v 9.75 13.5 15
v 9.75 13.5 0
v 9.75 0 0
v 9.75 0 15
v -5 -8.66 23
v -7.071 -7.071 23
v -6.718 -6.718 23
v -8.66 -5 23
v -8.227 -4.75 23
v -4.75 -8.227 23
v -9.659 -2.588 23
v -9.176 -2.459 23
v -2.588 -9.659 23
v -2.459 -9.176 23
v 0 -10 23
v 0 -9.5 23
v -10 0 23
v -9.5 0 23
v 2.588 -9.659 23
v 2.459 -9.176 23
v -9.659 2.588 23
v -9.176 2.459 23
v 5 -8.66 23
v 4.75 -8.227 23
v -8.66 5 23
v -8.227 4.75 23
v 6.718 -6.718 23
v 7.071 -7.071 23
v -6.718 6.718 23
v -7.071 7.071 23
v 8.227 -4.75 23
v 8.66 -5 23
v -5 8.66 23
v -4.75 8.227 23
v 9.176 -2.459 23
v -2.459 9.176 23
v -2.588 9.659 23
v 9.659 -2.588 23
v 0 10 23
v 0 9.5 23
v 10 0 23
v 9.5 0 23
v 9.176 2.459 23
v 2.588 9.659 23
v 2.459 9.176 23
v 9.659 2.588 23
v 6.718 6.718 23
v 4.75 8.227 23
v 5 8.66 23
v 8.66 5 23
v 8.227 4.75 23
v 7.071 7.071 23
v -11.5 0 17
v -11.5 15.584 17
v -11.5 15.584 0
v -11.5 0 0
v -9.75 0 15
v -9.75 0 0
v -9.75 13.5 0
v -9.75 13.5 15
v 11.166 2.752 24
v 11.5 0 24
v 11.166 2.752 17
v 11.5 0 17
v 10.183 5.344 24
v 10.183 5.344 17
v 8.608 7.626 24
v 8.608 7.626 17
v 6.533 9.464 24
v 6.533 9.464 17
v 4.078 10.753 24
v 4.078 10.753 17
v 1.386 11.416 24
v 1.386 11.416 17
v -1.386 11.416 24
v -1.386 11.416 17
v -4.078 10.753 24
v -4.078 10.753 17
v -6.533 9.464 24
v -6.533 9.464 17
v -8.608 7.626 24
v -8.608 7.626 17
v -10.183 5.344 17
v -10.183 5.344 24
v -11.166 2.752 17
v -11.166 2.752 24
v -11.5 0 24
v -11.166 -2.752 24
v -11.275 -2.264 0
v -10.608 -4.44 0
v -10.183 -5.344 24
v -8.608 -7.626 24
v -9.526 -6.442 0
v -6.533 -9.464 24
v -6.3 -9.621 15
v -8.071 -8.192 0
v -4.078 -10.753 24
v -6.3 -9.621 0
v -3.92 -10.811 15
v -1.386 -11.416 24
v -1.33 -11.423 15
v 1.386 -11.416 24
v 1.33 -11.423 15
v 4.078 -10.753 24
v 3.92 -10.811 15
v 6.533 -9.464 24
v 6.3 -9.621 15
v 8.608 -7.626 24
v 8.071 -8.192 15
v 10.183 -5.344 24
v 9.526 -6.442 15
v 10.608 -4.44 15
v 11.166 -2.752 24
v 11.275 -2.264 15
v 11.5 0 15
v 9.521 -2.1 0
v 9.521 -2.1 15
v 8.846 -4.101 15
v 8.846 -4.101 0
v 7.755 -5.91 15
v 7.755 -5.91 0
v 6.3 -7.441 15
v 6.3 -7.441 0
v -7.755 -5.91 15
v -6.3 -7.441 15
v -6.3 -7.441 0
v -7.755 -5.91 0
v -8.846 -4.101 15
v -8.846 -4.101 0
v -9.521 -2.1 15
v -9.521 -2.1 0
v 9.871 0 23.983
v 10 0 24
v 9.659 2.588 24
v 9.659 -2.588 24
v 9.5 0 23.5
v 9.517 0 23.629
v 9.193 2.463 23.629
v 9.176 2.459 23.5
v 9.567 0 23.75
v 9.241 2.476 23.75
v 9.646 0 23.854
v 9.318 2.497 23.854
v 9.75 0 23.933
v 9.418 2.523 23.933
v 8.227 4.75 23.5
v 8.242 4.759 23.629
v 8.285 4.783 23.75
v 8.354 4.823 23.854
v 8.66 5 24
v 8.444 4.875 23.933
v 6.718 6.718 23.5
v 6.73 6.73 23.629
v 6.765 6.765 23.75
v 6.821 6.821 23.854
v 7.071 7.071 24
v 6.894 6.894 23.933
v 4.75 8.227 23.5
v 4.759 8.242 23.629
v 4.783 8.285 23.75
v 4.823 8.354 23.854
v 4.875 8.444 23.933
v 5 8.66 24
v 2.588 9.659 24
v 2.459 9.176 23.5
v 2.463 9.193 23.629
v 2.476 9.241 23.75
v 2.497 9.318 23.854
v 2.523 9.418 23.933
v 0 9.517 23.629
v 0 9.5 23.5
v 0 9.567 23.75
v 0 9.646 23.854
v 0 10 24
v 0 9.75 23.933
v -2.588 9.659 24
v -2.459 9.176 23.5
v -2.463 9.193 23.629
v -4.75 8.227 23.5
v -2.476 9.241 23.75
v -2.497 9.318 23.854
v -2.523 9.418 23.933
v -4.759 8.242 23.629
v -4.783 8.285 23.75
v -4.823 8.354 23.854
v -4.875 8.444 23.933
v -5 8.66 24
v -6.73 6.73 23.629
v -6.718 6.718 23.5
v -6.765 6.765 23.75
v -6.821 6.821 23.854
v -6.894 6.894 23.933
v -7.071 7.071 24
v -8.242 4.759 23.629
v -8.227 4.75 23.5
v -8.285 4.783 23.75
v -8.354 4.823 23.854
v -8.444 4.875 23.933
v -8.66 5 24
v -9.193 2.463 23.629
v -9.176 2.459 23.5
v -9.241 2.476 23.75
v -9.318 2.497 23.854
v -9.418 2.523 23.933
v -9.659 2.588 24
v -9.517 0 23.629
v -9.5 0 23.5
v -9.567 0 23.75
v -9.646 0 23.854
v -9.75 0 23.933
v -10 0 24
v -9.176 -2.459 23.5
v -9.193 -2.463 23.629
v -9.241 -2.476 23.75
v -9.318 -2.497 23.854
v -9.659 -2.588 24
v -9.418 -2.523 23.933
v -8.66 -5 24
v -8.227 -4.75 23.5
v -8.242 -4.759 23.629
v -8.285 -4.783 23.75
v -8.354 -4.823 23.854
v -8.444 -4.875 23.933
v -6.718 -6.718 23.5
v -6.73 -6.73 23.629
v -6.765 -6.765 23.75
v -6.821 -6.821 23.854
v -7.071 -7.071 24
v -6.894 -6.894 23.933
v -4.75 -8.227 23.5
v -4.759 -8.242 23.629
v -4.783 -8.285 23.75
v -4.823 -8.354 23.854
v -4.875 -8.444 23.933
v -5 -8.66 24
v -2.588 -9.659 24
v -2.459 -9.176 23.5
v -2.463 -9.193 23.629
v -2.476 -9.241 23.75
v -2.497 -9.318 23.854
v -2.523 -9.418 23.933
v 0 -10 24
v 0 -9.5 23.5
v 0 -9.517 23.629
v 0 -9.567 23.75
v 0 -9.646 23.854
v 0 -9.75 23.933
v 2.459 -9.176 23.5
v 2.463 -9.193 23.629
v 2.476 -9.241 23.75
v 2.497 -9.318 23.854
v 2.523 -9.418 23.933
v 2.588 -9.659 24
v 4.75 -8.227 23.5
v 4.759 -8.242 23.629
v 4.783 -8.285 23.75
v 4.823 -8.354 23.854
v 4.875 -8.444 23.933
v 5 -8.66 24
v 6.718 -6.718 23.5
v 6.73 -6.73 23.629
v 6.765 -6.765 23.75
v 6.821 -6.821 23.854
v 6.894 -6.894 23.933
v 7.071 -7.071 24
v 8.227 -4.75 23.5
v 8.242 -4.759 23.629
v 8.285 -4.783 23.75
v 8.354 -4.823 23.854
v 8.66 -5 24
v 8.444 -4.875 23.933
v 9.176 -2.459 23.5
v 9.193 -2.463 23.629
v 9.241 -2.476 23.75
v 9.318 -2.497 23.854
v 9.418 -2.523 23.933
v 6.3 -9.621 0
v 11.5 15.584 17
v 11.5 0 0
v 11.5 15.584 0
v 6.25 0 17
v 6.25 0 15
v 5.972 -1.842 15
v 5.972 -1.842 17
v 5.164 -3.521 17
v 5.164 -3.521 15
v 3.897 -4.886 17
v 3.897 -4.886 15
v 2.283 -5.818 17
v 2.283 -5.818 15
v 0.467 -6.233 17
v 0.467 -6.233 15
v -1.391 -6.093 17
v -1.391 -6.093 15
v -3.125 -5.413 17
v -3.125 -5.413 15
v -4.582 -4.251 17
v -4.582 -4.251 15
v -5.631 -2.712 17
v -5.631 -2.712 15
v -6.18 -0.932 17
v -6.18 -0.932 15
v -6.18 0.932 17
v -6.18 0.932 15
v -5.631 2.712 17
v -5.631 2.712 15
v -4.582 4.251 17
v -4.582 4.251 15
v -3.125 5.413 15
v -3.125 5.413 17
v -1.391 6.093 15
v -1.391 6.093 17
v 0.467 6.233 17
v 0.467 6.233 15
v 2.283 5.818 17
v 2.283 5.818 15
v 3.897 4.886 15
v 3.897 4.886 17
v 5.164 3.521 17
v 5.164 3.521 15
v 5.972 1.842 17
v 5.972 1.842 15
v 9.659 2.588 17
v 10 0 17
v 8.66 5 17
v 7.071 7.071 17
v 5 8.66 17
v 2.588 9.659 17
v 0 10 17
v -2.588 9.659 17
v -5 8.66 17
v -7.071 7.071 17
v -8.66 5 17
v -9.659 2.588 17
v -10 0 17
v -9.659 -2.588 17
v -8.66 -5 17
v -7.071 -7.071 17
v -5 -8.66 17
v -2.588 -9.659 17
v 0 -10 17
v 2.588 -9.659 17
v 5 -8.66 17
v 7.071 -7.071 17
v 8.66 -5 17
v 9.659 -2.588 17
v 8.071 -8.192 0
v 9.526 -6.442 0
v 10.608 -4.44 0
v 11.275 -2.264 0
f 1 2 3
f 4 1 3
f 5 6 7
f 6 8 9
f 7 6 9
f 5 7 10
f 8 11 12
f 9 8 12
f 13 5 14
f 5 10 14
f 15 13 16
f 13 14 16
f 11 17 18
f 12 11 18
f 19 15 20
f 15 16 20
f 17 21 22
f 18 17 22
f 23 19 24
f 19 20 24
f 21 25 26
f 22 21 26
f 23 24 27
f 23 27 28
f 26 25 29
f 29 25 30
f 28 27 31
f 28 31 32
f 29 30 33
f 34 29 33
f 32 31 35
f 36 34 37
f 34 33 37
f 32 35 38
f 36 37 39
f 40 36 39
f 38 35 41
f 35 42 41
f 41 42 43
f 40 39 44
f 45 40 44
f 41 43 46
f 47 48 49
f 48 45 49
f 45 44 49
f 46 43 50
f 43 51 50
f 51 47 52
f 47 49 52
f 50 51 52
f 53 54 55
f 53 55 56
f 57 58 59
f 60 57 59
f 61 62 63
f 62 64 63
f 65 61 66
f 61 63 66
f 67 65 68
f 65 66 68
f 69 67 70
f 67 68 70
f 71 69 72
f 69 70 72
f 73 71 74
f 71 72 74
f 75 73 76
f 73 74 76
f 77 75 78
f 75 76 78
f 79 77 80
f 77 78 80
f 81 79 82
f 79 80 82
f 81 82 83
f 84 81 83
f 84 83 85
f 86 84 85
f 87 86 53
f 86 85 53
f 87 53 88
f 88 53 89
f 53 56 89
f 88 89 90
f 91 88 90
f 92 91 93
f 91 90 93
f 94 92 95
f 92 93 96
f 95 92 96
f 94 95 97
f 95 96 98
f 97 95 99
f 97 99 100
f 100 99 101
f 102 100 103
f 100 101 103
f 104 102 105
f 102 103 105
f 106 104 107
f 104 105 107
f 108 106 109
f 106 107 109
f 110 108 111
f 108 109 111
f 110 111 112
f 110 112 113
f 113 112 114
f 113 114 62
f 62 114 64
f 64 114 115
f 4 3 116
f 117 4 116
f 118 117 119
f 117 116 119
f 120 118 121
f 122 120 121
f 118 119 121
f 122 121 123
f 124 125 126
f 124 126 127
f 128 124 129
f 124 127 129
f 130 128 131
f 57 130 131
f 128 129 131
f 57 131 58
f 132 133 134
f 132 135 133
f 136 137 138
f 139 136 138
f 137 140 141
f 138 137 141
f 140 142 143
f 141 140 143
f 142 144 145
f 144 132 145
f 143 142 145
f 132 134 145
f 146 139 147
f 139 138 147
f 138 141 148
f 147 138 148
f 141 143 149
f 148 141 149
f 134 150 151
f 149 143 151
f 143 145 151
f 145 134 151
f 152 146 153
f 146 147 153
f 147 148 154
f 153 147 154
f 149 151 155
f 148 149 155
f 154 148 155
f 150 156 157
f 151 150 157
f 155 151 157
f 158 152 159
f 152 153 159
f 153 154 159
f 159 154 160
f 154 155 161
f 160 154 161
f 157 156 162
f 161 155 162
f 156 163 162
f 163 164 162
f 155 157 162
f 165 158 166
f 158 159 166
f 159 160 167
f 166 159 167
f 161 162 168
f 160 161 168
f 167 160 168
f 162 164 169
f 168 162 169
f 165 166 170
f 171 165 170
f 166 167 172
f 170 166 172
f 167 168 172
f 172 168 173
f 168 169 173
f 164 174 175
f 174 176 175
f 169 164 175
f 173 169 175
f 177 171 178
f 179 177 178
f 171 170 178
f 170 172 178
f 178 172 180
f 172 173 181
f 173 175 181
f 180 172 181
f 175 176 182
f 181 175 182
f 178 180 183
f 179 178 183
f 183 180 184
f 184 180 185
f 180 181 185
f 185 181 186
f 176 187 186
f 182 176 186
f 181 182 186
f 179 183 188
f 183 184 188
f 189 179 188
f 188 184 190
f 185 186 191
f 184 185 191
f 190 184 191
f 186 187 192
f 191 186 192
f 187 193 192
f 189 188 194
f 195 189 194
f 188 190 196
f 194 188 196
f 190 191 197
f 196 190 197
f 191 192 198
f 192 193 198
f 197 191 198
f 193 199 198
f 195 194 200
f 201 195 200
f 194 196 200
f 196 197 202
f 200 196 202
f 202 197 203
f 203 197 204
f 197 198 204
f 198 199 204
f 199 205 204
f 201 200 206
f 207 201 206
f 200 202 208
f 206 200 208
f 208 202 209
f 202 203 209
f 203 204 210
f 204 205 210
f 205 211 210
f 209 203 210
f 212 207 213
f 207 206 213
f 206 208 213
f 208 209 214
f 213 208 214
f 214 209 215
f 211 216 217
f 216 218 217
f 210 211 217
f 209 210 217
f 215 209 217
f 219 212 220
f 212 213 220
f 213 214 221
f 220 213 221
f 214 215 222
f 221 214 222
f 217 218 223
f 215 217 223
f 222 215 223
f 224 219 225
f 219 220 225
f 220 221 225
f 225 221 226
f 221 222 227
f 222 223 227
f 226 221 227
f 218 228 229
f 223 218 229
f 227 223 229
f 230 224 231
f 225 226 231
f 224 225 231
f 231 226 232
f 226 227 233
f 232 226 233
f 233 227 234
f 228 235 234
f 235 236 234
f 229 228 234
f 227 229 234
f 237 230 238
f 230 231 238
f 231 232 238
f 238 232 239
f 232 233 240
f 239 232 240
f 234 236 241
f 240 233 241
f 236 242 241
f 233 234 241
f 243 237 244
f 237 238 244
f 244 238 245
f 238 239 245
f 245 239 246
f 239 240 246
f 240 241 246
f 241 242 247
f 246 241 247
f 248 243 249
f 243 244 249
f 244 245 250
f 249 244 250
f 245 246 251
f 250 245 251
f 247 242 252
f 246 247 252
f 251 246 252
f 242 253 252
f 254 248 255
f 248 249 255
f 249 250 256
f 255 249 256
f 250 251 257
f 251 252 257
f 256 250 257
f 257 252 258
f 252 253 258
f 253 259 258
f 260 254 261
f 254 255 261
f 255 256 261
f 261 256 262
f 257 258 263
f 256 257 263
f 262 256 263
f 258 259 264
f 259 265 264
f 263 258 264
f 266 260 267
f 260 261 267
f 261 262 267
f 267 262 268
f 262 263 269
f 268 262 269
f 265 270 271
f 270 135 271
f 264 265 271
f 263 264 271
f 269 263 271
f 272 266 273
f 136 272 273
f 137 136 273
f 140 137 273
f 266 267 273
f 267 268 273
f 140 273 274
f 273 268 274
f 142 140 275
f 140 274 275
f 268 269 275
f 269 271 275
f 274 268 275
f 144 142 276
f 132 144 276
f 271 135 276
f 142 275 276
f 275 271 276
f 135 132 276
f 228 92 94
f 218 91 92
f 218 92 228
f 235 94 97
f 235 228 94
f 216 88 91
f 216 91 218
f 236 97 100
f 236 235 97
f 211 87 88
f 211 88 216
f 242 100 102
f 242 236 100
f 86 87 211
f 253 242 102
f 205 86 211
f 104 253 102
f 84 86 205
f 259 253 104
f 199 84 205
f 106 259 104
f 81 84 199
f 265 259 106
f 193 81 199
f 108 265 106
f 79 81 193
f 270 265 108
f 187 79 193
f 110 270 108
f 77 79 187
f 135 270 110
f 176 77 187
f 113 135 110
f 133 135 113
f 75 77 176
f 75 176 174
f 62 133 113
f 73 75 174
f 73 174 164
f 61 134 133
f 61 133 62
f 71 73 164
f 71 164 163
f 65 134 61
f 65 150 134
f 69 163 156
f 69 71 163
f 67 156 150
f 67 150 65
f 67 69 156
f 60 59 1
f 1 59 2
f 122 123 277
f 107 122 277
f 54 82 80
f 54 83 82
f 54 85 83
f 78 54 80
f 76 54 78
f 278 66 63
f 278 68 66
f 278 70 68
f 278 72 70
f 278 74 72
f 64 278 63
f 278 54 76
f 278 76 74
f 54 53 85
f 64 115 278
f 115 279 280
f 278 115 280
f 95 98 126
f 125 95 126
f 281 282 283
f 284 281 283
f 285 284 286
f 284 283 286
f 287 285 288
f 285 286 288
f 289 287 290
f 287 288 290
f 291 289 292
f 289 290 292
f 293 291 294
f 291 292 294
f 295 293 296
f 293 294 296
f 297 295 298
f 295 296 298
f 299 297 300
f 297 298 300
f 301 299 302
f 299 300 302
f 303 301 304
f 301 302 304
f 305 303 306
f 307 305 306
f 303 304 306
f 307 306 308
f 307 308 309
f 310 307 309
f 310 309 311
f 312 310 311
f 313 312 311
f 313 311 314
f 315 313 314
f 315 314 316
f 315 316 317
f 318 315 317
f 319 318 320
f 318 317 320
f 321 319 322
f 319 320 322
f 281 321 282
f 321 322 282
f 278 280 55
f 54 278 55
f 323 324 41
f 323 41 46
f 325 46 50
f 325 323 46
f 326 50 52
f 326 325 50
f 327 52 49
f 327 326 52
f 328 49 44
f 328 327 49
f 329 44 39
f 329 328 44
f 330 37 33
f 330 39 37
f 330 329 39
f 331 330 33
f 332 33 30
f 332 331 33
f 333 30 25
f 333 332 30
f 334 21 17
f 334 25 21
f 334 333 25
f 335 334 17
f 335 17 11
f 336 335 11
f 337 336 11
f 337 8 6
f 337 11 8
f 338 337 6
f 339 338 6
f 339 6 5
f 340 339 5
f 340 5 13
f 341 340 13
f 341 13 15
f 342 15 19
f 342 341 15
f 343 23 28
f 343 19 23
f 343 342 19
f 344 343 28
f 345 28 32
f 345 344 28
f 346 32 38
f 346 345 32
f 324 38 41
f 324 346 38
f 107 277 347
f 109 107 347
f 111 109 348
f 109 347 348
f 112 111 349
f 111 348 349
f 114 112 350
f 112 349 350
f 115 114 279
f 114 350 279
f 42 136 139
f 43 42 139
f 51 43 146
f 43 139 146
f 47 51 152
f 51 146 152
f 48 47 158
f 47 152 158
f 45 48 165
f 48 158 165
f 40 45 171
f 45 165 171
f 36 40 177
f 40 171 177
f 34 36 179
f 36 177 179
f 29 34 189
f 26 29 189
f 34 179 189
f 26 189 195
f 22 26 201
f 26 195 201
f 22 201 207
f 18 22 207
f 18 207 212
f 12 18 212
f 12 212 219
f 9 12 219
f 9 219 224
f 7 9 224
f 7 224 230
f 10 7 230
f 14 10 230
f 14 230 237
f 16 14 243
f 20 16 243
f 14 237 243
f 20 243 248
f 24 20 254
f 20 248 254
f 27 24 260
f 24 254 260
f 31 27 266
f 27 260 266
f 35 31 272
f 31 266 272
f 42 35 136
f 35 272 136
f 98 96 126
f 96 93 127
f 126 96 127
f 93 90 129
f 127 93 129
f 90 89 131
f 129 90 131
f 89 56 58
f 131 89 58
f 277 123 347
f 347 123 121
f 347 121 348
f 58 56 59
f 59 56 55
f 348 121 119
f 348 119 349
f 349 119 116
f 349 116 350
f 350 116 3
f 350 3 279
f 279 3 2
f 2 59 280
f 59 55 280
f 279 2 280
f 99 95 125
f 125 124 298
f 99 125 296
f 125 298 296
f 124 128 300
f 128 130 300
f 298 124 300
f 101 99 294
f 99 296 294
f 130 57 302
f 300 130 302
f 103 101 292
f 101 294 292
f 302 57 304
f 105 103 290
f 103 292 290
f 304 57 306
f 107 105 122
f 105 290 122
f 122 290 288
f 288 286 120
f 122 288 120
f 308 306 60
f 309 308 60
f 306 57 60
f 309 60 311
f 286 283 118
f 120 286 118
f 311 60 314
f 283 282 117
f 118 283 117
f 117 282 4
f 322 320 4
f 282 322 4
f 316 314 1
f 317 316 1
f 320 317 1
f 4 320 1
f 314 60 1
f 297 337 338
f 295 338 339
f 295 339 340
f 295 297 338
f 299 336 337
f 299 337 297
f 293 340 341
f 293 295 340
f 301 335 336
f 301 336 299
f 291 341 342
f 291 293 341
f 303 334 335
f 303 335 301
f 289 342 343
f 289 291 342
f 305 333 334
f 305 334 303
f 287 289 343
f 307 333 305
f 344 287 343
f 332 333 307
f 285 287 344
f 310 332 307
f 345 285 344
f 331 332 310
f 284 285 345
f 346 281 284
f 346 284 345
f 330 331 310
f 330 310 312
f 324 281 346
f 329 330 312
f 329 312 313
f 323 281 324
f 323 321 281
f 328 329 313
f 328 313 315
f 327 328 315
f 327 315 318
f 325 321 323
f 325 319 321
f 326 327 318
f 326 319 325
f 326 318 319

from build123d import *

# Parameters (mm, degrees)
F1_DEPTH = 15
F3_DEPTH = 2
F4_R     = 11.5
F4_R_2   = 10
F5_DEPTH = 7
F6_R     = 11.5
F6_R_2   = 9.5
F7_DEPTH = 1
F8_R     = 0.5


with BuildPart() as f1:
    # F0 (on Top) → F1 (new body)
    with BuildSketch(Plane.XY):
        with BuildLine():
            ThreePointArc((-6.3, -7.4412700529), (-8.8455497285, -4.1010669343), (-9.75, 0))
            Line((-9.75, 0), (-11.5, 0))
            ThreePointArc((-11.5, 0), (-10.1168176815, -5.4680892458), (-6.3, -9.6208107766))
            Line((-6.3, -9.6208107766), (-6.3, -7.4412700529))
        make_face()
        with BuildLine():
            Line((11.5, 0), (9.75, 0))
            ThreePointArc((9.75, 0), (8.8455497285, -4.1010669343), (6.3, -7.4412700529))
            Line((6.3, -7.4412700529), (6.3, -9.6208107766))
            ThreePointArc((6.3, -9.6208107766), (10.1168176815, -5.4680892458), (11.5, 0))
        make_face()
        with BuildLine():
            Line((9.75, 13.5), (9.75, 6.0981554588))
            ThreePointArc((9.75, 6.0981554588), (11.0538454847, 3.1721443851), (11.5, 0))
            Line((11.5, 0), (11.5, 13.5))
            Line((11.5, 13.5), (9.75, 13.5))
        make_face()
        with BuildLine():
            Line((9.75, 6.0981554588), (9.75, 0))
            Line((9.75, 0), (11.5, 0))
            ThreePointArc((11.5, 0), (11.0538454847, 3.1721443851), (9.75, 6.0981554588))
        make_face()
        with BuildLine():
            ThreePointArc((-11.5, 0), (-11.0538454847, 3.1721443851), (-9.75, 6.0981554588))
            Line((-9.75, 6.0981554588), (-9.75, 13.5))
            Line((-9.75, 13.5), (-11.5, 13.5))
            Line((-11.5, 13.5), (-11.5, 0))
        make_face()
        with BuildLine():
            Line((-11.5, 0), (-9.75, 0))
            Line((-9.75, 0), (-9.75, 6.0981554588))
            ThreePointArc((-9.75, 6.0981554588), (-11.0538454847, 3.1721443851), (-11.5, 0))
        make_face()
        Polygon((-9.75, 13.5), (9.75, 13.5), (11.5, 13.5), (11.5, 15.583621338), (-11.5, 15.583621338), (-11.5, 13.5), align=None)
    extrude(amount=F1_DEPTH)

    # F2 (on face) → F3 (join)
    with BuildSketch(Plane.XY.offset(15)):
        with BuildLine():
            Line((11.5, 15.583621338), (-11.5, 15.583621338))
            Line((-11.5, 15.583621338), (-11.5, 0))
            ThreePointArc((-11.5, 0), (0, 11.5), (11.5, 0))
            Line((11.5, 0), (11.5, 15.583621338))
        make_face()
        with BuildLine():
            ThreePointArc((11.5, 0), (0, 11.5), (-11.5, 0))
            Line((-11.5, 0), (-6.25, 0))
            ThreePointArc((-6.25, 0), (0, 6.25), (6.25, 0))
            Line((6.25, 0), (11.5, 0))
        make_face()
        with BuildLine():
            Line((-6.25, 0), (-11.5, 0))
            ThreePointArc((-11.5, 0), (0, -11.5), (11.5, 0))
            Line((11.5, 0), (6.25, 0))
            ThreePointArc((6.25, 0), (0, -6.25), (-6.25, 0))
        make_face()
    extrude(amount=F3_DEPTH)

    # F4 (on face) → F5 (join)
    with BuildSketch(Plane.XY.offset(17)):
        Circle(F4_R)
        Circle(F4_R_2, mode=Mode.SUBTRACT)
    extrude(amount=F5_DEPTH)

    # F6 (on face) → F7 (join)
    with BuildSketch(Plane.XY.offset(24)):
        Circle(F6_R)
        Circle(F6_R_2, mode=Mode.SUBTRACT)
    extrude(amount=-F7_DEPTH)

    # F8
    f8_edges = [f1.edges().sort_by_distance(p)[0] for p in [
        (-9.5, 0, 24),
    ]]
    fillet(f8_edges, radius=F8_R)


solid = f1.part
